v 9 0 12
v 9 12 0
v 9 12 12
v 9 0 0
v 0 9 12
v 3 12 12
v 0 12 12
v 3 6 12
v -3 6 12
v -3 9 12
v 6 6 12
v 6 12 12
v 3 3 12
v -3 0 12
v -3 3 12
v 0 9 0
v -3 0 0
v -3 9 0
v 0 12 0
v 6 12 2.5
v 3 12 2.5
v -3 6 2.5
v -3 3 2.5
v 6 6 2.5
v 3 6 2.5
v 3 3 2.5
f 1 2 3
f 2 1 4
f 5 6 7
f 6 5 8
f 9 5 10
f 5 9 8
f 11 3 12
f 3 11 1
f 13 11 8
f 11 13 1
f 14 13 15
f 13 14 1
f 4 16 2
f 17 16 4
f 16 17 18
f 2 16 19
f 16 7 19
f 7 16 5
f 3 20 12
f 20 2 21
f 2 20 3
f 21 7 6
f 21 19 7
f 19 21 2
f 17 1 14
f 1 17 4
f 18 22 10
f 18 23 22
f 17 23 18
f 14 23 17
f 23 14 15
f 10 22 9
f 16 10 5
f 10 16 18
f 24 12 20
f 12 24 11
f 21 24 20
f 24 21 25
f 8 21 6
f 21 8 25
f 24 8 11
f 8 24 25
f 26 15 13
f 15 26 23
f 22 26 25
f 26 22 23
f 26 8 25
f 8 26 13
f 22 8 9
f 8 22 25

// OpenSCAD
difference(){

union(){
    cube ([9,12,12]);
    translate([9,0,0]) rotate([0,0,90]) cube ([9,12,12]);
}

union(){
    translate ([3,6,2.5]) cube ([3,15,15]);
    translate ([4.5,0,0]) rotate([0,0,90]) translate ([3,1.5,2.5]) cube ([3,15,15]);
}
}
